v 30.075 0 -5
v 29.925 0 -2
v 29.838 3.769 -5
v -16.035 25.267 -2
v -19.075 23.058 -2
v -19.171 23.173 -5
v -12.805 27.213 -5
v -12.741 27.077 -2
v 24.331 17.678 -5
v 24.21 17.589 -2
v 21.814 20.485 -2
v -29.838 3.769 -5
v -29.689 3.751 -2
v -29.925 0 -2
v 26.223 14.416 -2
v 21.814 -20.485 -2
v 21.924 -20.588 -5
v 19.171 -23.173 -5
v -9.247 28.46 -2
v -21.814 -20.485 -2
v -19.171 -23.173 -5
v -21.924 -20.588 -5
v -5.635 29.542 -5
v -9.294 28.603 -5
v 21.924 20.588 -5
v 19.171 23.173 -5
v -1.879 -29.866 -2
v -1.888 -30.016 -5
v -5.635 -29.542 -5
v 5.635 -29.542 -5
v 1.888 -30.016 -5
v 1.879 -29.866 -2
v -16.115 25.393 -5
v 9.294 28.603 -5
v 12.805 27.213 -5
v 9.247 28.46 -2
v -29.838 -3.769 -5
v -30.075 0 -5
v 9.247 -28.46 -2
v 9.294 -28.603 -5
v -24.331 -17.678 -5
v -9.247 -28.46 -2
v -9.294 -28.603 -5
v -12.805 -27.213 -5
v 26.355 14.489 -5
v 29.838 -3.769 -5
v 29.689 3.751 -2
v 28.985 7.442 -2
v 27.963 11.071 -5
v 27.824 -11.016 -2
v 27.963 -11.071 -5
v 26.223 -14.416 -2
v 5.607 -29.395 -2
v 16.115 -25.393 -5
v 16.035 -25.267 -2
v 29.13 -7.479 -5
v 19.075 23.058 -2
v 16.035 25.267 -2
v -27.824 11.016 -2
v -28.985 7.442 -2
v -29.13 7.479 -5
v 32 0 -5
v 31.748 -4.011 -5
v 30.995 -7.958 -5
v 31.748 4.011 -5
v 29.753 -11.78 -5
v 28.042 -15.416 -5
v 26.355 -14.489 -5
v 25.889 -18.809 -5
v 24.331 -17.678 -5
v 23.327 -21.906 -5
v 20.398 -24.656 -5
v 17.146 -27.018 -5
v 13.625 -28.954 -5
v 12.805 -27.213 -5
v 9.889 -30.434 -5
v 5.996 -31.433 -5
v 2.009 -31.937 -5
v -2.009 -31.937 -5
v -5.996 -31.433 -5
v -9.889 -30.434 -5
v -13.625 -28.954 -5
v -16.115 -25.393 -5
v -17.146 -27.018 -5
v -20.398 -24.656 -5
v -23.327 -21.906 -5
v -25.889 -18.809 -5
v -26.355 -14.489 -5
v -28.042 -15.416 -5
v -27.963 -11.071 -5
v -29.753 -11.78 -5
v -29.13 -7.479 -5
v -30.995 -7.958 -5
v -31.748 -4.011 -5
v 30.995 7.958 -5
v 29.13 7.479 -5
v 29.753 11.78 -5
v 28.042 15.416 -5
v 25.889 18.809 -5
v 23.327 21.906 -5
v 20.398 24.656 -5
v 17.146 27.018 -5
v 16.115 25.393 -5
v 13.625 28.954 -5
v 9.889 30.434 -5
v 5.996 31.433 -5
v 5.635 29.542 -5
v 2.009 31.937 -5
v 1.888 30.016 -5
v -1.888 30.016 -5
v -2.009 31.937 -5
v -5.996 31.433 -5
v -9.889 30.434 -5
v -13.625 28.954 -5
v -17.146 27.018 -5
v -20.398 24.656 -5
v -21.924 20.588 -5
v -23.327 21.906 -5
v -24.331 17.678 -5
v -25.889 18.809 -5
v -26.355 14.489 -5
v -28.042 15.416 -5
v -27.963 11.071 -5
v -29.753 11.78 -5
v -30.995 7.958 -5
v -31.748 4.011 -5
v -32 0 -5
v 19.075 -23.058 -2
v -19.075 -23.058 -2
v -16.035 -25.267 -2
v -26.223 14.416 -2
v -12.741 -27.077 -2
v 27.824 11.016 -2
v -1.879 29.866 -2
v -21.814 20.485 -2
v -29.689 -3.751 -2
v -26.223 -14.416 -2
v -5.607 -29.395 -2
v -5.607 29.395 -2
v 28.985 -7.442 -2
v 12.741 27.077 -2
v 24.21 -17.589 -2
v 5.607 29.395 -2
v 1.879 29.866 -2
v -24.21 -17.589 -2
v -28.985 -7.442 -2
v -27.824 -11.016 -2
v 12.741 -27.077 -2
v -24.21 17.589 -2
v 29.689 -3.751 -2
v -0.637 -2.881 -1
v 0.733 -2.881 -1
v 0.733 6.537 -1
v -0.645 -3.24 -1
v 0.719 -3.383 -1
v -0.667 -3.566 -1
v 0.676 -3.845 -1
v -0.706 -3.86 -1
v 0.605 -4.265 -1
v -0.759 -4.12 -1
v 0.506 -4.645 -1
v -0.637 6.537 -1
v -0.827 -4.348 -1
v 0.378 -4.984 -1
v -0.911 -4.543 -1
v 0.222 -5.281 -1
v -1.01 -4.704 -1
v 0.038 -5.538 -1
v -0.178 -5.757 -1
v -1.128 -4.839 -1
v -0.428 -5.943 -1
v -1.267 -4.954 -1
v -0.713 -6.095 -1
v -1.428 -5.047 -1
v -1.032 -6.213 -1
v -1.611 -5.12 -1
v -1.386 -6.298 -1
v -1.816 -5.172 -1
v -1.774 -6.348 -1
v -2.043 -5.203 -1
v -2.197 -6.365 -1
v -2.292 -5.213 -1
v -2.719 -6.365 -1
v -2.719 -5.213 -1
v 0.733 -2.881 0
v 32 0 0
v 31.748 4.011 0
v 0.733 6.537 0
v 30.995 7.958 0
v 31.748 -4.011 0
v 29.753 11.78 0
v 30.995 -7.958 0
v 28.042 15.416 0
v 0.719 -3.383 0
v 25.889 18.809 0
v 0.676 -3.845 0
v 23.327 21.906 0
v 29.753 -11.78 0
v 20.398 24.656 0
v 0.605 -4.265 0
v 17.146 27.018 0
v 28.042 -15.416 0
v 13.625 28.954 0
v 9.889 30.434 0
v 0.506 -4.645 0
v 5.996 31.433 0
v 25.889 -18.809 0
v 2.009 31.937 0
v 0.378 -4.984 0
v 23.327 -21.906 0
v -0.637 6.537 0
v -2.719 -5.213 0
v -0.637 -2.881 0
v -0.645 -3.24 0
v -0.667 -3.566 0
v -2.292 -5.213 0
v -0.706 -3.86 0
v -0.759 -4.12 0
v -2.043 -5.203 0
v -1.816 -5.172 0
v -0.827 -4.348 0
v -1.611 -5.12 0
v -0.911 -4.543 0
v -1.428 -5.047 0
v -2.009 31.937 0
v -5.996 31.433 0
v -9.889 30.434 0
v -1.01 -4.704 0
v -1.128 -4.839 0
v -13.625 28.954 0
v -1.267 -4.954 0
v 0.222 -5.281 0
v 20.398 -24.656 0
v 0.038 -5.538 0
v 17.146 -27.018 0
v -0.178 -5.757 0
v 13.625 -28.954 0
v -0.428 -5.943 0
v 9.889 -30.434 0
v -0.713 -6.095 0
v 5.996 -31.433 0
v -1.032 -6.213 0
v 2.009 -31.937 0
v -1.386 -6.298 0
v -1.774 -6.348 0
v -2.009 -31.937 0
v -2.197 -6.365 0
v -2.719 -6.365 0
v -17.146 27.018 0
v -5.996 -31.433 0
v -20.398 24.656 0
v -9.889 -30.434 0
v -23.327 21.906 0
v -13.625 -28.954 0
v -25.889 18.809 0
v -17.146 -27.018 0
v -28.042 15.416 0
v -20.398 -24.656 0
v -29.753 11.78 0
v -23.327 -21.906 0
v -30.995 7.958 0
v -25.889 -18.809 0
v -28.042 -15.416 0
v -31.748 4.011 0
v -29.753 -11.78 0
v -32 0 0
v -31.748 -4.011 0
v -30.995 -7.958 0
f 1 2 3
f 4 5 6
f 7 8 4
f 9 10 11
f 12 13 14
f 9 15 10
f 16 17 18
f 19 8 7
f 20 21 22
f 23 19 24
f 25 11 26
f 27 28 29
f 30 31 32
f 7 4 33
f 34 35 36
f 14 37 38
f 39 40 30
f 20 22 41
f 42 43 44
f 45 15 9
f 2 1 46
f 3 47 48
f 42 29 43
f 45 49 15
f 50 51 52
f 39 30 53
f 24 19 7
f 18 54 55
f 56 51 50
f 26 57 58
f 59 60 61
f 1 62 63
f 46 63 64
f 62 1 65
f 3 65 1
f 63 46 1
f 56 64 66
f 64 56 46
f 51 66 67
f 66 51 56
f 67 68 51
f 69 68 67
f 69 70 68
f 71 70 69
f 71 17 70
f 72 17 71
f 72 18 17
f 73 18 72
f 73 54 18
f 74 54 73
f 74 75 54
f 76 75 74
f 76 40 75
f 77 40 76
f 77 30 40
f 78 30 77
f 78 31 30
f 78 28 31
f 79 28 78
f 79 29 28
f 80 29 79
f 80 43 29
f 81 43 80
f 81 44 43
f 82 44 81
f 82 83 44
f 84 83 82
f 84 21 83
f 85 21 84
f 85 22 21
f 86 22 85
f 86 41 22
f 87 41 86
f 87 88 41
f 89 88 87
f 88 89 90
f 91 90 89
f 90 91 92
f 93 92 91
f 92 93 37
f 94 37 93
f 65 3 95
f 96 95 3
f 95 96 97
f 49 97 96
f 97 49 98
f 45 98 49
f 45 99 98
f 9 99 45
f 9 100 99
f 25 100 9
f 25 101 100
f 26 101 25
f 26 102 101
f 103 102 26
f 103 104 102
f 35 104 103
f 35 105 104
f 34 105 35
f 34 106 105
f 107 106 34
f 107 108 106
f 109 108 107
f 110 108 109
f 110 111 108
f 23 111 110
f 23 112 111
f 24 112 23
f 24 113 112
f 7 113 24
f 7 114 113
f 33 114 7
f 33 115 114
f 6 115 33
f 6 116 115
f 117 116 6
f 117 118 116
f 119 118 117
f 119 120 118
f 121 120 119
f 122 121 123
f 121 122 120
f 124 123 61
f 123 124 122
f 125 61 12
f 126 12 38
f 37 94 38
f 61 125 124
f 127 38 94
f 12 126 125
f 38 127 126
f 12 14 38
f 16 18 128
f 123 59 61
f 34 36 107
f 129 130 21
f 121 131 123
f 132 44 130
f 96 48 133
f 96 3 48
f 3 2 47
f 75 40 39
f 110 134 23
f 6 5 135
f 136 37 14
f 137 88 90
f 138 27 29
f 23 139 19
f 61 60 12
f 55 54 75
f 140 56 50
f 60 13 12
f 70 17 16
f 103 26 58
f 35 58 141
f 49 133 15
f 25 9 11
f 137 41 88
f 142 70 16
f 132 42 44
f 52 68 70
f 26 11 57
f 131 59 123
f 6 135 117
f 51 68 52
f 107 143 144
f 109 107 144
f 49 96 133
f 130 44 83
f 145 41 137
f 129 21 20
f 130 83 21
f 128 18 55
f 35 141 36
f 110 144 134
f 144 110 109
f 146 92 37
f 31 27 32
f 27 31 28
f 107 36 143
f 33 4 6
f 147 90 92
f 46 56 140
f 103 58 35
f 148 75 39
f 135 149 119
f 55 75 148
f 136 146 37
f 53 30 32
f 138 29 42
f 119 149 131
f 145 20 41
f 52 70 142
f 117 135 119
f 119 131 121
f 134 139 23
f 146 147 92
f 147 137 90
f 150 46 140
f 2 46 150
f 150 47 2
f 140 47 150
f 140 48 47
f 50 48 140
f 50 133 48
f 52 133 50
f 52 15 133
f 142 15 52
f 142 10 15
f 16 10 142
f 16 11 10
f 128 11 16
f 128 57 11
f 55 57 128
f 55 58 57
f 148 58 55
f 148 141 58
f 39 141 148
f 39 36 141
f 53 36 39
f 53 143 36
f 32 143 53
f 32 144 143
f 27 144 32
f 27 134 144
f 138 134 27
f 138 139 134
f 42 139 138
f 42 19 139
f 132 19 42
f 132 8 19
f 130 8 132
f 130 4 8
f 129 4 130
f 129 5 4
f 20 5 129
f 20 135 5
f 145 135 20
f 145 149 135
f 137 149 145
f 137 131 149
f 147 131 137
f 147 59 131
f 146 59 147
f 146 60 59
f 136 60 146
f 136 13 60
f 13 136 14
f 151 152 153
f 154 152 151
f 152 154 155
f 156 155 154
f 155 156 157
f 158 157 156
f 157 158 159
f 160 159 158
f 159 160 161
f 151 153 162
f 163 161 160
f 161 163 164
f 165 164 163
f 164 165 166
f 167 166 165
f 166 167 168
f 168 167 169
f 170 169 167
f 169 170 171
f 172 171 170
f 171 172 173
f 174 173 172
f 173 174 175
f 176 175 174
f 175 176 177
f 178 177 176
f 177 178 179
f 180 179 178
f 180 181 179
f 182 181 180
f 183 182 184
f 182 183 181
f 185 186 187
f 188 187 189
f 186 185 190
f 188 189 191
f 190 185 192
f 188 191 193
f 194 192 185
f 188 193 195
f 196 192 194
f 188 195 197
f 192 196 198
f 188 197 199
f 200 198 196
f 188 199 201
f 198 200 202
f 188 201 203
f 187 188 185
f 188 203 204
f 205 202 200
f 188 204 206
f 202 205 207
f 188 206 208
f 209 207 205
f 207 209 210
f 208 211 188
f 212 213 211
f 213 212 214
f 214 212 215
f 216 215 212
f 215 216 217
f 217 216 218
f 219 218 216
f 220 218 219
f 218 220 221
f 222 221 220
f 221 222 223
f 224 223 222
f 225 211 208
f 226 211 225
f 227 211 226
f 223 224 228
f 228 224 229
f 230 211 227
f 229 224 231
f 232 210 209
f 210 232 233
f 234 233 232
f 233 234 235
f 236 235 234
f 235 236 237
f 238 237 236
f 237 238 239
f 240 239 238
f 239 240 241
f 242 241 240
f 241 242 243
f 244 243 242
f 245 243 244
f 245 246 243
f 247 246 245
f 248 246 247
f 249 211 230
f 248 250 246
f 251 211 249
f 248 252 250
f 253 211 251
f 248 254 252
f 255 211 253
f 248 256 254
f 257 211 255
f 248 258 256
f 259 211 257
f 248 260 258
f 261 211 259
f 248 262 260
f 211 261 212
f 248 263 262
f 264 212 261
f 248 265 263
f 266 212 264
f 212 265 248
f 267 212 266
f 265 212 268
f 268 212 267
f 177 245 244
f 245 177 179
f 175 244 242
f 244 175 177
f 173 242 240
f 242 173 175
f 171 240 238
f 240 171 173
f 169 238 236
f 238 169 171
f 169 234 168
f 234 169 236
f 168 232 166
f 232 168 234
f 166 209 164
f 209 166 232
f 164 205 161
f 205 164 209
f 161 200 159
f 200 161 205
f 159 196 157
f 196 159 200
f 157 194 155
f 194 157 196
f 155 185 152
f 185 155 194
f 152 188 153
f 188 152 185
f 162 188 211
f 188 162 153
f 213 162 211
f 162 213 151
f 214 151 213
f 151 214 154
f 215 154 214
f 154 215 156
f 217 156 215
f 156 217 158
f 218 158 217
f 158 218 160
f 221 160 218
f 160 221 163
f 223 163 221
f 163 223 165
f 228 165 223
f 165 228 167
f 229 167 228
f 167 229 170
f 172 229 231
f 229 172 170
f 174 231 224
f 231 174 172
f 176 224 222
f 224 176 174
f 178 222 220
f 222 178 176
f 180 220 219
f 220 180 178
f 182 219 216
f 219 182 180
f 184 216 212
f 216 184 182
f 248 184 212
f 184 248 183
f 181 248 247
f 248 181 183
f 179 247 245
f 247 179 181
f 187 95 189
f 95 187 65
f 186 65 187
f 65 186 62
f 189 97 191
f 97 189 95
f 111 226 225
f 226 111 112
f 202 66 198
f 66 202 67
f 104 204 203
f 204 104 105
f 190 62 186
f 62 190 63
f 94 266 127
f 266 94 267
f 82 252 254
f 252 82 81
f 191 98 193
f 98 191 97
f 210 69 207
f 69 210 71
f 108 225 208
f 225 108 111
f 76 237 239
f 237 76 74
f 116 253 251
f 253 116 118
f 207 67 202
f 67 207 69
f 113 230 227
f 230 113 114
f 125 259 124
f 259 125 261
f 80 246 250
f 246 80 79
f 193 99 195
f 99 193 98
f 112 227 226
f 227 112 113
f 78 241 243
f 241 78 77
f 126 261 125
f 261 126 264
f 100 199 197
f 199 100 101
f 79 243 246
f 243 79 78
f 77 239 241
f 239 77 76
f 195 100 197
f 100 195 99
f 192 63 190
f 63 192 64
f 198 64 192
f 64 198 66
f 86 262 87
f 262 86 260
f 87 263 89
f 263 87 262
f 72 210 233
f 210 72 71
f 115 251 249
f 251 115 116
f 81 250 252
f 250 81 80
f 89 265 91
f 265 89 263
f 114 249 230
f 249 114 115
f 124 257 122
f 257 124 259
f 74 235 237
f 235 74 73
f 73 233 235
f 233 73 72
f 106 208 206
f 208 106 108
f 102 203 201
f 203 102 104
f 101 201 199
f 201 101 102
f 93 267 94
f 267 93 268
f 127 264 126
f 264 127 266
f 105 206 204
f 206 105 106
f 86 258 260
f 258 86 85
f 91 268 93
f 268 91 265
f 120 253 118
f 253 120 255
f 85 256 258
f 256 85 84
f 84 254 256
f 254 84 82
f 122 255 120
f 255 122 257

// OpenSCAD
$fn = 50;

difference() {
	union() {
		translate(v = [0, 0, -5.0]) {
			cylinder(h = 5, r = 32.0);
		}
	}
	union() {
		#translate(v = [0, 0, -5.0]) {
			cylinder(h = 3, r1 = 30.075, r2 = 29.925);
		}
		translate(v = [0, 0, -1]) {
			linear_extrude(height = 1) {
				text(font = "Impact", halign = "center", size = 10, text = "J", valign = "center");
			}
		}
	}
}
